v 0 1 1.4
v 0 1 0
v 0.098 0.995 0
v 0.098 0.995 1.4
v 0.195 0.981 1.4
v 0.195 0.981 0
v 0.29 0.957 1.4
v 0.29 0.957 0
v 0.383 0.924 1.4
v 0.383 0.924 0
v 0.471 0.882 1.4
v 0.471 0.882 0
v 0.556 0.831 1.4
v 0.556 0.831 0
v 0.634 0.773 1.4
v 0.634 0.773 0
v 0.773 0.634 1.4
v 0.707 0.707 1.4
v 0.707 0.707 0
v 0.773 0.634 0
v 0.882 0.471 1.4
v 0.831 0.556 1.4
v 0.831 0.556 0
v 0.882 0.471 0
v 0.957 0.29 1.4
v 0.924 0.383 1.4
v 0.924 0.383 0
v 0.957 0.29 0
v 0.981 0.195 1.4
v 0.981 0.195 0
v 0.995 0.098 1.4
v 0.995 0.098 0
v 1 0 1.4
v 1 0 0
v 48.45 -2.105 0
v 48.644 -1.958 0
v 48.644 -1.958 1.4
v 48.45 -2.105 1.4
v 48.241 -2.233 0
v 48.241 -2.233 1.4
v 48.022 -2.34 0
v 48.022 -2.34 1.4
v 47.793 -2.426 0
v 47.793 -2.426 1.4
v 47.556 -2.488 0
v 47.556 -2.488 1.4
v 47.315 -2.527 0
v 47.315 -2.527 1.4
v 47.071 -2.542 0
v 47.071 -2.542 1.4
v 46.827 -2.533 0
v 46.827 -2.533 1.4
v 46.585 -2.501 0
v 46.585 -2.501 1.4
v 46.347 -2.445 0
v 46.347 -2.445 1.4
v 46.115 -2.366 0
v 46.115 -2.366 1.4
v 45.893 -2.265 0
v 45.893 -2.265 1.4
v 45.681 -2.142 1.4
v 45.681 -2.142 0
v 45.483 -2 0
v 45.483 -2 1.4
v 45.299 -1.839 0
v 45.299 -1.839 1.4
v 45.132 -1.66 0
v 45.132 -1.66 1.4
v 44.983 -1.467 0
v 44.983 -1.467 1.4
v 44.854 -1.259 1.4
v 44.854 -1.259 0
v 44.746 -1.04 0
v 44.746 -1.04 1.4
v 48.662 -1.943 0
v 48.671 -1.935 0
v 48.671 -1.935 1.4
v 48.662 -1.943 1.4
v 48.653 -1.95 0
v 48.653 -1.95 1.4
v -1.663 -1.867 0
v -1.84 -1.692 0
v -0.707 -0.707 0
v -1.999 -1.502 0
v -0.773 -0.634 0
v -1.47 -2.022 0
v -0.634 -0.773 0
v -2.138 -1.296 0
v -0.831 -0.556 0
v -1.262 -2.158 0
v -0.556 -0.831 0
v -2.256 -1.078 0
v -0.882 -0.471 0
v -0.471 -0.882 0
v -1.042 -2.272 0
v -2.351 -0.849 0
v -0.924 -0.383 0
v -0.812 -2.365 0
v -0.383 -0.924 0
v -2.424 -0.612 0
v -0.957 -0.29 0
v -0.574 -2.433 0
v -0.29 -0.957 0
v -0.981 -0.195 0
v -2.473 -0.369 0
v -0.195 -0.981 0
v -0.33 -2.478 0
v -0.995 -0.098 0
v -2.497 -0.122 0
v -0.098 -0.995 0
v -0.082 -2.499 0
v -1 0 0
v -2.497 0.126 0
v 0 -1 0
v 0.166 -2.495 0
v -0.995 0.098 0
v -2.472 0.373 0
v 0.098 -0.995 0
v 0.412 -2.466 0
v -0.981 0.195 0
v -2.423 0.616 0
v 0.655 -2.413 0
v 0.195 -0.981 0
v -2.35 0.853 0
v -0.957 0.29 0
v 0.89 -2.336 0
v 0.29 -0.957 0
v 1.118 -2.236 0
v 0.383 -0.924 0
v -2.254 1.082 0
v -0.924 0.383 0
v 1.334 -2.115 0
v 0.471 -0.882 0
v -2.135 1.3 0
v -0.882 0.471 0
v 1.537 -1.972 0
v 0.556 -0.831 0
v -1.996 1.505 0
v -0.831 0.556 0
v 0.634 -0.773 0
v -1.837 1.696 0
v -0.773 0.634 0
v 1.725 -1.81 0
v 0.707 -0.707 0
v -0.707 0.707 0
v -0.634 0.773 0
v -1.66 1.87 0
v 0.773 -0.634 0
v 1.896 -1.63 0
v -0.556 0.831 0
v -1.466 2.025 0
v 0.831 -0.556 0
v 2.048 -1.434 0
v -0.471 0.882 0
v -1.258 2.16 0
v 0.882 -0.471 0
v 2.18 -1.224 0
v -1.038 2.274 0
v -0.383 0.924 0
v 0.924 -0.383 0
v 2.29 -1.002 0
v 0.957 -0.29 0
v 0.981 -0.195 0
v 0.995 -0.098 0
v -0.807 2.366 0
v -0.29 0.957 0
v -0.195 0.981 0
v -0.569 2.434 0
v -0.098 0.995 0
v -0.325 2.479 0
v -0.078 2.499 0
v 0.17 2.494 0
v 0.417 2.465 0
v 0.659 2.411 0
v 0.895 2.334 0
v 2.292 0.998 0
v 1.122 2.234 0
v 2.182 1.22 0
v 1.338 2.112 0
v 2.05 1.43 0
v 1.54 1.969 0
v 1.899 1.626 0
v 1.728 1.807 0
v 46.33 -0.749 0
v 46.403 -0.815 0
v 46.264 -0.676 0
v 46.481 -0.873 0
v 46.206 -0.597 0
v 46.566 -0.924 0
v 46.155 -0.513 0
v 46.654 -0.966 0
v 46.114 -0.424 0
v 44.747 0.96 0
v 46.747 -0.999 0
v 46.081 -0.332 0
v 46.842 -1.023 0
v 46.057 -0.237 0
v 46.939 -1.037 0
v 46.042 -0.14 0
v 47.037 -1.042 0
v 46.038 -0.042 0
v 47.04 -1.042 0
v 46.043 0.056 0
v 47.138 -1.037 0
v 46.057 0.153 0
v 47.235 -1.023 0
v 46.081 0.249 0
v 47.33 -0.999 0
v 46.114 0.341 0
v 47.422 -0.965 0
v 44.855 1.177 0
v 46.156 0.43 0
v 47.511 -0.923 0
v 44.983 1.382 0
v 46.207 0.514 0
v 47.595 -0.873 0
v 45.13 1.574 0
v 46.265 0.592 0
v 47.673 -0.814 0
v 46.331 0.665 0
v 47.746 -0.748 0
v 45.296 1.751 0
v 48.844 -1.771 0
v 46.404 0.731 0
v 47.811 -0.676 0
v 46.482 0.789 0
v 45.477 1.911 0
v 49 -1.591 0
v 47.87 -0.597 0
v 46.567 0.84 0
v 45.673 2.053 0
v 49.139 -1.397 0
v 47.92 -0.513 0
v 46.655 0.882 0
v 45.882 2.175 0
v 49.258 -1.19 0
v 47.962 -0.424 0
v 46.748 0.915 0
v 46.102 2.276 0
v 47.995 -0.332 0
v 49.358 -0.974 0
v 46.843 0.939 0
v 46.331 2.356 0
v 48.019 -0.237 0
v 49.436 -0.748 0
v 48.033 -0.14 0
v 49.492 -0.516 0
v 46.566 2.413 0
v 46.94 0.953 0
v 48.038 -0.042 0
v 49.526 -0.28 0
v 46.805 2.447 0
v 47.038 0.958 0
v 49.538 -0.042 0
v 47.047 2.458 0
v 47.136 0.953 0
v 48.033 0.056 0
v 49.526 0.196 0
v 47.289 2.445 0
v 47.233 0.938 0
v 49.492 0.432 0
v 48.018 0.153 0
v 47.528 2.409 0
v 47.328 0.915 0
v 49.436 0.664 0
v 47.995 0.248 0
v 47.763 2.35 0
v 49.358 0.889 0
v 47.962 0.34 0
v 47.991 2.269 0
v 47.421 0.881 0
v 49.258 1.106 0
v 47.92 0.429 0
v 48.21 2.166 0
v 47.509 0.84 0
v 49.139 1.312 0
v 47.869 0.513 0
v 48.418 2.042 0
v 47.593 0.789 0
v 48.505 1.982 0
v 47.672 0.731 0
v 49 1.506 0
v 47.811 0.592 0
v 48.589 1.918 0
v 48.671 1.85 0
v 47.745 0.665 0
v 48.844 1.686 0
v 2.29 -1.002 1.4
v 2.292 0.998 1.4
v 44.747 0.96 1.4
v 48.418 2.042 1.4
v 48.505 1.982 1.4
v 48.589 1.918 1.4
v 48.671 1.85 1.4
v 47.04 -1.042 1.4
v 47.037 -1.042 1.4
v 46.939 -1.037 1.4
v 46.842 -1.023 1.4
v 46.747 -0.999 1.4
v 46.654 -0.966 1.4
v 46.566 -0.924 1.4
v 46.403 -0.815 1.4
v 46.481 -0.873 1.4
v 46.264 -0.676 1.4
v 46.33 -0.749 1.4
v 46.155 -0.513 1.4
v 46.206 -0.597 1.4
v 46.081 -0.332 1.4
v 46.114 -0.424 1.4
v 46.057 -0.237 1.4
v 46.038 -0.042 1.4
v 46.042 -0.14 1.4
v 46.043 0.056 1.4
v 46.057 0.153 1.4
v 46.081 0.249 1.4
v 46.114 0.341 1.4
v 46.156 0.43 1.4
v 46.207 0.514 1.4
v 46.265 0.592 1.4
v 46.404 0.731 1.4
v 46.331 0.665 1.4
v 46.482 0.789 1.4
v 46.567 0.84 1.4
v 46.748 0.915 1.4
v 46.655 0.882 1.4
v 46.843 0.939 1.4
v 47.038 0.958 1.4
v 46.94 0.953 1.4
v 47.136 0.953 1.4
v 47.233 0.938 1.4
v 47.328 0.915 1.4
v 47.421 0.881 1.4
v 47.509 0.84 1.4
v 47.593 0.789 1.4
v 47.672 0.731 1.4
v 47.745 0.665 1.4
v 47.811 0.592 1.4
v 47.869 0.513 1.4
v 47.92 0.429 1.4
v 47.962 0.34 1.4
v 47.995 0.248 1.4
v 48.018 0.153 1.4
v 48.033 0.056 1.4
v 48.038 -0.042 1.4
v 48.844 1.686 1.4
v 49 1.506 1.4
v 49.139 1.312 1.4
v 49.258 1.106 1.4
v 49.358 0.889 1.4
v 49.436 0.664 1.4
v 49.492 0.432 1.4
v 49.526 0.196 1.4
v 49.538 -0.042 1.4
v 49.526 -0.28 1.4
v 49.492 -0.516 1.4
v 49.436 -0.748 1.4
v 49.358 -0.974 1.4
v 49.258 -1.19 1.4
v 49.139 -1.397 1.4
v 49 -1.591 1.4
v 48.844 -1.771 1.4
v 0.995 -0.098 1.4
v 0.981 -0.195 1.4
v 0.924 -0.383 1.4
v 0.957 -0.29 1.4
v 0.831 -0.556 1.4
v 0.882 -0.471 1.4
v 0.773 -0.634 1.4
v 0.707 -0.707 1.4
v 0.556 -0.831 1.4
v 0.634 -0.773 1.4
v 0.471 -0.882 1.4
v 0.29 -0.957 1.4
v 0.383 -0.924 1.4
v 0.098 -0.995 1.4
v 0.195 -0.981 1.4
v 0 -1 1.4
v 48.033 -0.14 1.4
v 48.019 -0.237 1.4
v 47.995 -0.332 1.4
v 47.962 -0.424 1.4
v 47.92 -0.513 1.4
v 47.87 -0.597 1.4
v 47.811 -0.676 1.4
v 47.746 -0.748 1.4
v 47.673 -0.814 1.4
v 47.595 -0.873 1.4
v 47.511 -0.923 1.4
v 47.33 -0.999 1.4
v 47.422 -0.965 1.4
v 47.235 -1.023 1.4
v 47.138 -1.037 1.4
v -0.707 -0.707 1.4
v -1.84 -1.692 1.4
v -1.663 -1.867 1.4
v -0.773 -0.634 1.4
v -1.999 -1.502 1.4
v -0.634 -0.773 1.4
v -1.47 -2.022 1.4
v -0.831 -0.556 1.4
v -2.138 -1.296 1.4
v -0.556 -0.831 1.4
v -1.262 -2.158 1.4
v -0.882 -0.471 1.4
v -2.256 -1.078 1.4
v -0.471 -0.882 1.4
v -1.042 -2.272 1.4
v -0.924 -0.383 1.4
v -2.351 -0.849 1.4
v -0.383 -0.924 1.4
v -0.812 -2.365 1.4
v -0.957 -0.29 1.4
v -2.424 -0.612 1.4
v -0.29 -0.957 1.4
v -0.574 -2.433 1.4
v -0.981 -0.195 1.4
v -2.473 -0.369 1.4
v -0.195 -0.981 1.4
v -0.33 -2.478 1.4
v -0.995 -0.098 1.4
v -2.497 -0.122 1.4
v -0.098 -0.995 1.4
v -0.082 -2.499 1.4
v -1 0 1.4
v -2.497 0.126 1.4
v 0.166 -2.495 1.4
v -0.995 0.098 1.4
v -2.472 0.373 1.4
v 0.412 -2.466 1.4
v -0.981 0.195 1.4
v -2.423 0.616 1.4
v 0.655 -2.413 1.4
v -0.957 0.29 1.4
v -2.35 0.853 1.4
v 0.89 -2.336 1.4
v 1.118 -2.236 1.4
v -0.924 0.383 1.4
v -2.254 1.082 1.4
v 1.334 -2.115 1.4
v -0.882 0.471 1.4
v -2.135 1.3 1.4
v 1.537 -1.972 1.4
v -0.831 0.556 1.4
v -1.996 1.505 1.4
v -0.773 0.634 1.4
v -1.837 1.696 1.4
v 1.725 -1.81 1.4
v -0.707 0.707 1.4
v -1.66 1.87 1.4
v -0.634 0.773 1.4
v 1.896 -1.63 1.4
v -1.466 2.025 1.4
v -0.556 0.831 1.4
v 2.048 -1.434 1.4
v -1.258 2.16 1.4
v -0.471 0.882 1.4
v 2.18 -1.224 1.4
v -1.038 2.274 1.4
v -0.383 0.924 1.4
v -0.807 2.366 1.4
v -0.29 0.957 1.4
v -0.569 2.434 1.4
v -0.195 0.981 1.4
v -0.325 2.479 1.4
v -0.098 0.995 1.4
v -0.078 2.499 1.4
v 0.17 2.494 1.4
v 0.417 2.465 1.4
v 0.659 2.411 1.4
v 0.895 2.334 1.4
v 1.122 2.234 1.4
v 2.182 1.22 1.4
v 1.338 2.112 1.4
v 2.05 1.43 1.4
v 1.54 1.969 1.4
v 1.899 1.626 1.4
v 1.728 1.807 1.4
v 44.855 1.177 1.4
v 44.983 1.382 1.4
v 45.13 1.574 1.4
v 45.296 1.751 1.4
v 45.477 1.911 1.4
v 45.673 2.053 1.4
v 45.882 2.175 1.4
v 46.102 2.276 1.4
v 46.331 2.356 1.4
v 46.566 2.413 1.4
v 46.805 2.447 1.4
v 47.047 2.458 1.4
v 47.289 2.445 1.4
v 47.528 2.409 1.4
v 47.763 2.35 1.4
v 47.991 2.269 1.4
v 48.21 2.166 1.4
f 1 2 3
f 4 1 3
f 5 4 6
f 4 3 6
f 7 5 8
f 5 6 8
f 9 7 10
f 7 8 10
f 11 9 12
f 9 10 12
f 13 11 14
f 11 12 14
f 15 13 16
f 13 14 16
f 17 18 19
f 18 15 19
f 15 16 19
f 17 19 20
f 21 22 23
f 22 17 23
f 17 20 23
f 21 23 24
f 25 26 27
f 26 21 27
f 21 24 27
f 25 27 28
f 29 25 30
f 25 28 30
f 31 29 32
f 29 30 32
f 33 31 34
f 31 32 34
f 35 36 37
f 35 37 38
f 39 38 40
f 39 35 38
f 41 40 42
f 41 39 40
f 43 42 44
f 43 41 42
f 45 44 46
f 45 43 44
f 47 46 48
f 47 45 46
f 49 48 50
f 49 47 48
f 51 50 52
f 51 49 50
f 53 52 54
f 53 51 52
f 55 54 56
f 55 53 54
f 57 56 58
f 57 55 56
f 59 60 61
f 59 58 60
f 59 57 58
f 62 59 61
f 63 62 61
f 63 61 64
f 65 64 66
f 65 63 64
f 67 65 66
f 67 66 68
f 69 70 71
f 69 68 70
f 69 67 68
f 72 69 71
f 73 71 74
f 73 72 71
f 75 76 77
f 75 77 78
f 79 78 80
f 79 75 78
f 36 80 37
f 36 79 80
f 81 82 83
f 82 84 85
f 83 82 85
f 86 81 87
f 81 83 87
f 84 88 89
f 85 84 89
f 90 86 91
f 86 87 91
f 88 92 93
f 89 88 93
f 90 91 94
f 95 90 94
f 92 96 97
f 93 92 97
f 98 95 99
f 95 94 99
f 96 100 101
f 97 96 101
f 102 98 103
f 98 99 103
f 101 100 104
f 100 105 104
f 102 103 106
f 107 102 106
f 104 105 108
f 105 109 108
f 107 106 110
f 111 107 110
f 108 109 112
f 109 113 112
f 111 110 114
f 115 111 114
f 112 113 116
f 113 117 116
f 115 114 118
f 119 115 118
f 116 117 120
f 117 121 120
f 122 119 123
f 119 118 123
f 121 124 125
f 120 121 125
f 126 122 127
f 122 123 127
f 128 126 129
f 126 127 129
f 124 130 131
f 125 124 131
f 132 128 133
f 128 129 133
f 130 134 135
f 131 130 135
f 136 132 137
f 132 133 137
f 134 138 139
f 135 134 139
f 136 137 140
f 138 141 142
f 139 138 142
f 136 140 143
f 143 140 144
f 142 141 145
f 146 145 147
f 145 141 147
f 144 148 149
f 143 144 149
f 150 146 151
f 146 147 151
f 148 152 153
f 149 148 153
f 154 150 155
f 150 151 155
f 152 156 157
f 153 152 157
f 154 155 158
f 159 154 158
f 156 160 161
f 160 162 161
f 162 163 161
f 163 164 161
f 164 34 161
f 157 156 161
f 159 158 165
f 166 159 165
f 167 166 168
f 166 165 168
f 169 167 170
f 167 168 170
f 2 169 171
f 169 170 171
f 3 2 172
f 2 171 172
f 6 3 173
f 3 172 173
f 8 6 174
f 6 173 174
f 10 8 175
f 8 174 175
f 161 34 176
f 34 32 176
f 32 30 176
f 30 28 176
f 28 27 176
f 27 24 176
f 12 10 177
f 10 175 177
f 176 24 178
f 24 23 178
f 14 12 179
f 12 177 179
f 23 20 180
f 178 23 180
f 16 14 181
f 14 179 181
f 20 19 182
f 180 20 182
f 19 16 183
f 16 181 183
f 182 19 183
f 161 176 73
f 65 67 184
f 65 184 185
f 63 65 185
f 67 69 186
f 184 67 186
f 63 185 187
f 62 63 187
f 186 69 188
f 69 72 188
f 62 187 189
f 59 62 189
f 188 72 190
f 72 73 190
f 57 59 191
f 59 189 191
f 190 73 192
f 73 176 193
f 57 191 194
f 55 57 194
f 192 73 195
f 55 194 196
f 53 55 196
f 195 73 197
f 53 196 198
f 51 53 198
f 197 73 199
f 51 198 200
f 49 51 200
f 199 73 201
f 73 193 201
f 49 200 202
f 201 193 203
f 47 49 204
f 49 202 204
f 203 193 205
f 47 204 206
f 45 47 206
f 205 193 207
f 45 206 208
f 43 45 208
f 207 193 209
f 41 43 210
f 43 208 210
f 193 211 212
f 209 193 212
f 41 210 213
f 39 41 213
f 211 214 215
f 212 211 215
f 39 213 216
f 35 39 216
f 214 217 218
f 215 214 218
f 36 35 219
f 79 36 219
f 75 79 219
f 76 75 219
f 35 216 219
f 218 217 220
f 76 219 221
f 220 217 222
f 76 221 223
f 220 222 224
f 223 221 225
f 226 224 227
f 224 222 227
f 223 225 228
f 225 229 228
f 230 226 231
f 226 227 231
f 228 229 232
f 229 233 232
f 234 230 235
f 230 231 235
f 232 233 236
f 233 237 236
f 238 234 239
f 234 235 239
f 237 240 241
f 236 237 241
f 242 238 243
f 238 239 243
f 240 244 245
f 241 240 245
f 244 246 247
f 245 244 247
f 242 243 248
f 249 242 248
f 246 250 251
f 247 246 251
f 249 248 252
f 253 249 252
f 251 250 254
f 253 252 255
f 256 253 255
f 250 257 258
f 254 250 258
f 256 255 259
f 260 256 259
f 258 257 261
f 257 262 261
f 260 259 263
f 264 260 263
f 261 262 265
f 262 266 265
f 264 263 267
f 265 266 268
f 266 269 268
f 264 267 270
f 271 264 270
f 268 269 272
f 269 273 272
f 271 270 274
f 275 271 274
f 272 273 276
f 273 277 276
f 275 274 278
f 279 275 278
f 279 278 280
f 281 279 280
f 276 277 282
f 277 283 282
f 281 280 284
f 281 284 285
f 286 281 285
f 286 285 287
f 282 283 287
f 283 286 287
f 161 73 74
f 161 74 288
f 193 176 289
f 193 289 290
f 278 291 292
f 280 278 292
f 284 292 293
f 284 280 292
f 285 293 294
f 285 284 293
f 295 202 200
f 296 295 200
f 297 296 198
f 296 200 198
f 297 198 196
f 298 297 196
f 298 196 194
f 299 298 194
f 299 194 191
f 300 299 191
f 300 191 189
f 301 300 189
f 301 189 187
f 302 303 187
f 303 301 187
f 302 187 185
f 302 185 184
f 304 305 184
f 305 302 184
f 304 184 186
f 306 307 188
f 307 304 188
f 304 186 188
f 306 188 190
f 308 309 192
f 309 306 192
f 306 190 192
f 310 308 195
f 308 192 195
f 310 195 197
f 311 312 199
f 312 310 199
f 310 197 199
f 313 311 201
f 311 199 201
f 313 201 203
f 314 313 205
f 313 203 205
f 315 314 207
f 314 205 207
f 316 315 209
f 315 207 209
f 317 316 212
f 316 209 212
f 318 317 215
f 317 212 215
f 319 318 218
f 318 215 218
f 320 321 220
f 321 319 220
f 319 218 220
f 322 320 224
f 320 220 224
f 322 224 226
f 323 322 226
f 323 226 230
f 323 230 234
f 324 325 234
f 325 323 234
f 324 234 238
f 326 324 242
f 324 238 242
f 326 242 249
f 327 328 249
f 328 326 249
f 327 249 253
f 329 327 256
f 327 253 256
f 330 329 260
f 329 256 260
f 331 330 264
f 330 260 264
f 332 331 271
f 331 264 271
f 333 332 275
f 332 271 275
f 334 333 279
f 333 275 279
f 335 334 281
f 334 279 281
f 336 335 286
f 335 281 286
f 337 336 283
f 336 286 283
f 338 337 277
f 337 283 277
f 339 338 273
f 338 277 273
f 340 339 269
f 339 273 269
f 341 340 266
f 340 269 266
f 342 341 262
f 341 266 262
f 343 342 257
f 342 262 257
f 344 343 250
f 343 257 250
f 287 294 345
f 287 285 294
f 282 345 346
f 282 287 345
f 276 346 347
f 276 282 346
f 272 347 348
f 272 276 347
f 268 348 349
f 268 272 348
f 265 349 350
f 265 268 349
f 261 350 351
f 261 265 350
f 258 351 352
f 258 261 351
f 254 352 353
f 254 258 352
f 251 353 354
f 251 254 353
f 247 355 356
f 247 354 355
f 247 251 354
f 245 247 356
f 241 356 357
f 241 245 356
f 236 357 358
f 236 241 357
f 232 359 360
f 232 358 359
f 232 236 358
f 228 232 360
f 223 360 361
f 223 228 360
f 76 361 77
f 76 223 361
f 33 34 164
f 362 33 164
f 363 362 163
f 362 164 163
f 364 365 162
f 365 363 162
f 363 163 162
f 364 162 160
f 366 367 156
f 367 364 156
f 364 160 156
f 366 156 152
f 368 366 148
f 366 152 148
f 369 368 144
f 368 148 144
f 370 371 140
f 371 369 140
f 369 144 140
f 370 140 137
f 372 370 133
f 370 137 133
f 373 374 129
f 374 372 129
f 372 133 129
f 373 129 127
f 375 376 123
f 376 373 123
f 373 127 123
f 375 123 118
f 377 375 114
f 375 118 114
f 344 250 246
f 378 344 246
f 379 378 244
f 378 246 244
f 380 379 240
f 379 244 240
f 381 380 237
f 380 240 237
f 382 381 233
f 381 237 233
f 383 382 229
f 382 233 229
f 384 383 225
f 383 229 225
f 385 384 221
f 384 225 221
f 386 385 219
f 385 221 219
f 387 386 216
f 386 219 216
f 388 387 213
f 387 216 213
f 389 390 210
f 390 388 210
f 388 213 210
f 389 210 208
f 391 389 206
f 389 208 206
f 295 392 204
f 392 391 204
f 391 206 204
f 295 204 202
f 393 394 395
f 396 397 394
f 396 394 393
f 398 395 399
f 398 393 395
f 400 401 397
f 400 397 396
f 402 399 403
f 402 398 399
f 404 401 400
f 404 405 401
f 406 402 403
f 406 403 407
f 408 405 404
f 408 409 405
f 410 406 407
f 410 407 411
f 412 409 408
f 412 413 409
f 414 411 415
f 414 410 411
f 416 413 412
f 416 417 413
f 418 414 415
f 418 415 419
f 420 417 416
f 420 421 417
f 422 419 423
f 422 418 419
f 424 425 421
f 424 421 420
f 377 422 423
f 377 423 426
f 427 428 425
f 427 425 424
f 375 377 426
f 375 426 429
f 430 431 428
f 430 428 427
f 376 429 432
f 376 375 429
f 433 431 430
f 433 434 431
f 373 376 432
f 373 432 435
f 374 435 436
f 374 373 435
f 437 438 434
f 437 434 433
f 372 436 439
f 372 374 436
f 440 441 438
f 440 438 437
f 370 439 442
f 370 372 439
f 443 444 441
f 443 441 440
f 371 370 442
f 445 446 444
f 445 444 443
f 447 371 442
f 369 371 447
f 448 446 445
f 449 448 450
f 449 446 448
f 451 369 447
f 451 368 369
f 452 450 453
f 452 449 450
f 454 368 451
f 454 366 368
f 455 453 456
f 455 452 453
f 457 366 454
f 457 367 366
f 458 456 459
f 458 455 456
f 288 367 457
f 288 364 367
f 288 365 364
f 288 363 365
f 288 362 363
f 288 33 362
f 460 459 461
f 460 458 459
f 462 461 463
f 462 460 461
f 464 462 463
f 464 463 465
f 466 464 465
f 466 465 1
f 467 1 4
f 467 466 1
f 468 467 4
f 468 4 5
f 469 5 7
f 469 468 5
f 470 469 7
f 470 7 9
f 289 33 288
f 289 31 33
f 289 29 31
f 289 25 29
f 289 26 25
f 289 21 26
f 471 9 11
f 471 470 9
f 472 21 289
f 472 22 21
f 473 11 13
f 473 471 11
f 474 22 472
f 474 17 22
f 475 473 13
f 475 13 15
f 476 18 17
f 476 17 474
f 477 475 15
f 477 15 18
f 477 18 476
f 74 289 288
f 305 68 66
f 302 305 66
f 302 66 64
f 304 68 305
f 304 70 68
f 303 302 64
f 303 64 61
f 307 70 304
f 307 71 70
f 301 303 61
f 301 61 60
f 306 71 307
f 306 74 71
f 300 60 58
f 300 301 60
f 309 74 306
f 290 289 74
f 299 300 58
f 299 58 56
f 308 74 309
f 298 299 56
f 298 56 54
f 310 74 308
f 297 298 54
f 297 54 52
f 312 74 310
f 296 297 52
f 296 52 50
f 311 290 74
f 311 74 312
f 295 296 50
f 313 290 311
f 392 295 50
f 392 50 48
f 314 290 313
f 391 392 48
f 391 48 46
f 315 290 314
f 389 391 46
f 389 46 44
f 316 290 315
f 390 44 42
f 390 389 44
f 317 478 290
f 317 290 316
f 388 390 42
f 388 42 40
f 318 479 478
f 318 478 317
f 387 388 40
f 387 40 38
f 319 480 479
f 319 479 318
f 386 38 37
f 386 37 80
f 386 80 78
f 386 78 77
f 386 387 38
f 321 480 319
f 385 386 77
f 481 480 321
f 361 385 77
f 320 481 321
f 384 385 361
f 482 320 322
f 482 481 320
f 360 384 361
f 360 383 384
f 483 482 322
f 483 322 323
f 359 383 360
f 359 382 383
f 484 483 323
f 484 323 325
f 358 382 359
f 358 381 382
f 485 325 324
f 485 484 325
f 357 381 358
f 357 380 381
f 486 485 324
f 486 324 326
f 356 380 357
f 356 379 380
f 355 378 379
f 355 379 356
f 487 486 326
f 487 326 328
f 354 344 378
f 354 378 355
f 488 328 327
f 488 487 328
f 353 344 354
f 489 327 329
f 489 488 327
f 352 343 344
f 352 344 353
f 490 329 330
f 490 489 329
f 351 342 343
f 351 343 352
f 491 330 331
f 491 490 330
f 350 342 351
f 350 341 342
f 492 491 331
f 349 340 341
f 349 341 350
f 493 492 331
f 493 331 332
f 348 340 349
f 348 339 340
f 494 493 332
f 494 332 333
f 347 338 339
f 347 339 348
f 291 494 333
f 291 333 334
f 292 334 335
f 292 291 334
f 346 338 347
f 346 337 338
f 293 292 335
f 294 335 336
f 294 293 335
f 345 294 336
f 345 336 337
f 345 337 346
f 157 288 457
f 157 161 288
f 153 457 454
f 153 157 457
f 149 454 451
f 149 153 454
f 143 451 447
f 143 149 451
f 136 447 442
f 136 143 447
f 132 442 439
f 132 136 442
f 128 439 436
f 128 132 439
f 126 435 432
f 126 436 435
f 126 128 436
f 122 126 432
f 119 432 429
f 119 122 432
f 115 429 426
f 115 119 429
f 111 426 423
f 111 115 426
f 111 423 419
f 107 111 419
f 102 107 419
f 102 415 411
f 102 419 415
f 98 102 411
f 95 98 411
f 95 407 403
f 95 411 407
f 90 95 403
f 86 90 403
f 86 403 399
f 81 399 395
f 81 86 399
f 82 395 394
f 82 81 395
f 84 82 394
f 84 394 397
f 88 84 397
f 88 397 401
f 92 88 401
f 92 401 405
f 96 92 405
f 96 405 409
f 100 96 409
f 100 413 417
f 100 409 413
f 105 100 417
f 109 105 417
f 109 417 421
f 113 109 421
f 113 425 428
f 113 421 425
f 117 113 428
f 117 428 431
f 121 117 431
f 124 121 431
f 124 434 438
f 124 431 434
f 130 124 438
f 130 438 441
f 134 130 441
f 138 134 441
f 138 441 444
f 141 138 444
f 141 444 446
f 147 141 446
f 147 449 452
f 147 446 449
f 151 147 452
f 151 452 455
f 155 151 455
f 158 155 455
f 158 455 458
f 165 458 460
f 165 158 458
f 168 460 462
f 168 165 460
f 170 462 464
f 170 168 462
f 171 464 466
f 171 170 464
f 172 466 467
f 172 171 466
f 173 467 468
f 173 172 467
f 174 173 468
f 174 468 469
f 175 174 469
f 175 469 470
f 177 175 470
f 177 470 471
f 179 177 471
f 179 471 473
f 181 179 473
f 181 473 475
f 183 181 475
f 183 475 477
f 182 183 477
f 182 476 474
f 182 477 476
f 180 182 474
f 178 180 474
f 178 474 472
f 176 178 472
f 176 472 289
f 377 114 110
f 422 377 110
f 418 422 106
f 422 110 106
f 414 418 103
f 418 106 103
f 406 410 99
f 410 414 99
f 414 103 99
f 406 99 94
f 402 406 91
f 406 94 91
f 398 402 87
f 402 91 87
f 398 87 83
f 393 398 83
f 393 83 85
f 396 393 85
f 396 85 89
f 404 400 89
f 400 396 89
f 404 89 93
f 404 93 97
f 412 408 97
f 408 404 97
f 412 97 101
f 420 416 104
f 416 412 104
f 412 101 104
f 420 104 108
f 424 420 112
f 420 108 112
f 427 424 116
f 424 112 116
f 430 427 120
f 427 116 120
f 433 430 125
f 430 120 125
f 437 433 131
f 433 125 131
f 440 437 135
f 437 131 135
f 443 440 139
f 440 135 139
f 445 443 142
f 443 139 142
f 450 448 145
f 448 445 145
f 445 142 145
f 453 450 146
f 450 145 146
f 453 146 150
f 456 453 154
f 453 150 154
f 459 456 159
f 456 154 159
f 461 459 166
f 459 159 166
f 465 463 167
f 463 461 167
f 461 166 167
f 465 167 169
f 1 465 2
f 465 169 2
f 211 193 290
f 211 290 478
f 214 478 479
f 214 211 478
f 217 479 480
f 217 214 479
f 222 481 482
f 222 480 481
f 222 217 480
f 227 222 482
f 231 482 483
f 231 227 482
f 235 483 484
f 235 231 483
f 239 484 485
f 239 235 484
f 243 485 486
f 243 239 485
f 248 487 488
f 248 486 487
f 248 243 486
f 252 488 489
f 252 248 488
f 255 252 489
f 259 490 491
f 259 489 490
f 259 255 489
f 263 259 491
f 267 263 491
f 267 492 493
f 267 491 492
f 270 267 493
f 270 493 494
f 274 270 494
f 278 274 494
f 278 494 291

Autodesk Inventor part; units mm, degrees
ref_plane "YZ Plane" through (0, 0, 0) normal (1, 0, 0) x (0, 1, 0)
ref_plane "XZ Plane" through (0, 0, 0) normal (0, 1, 0) x (-1, 0, 0)
ref_plane "XY Plane" through (0, 0, 0) normal (0, 0, 1) x (1, 0, 0)
sketch "Sketch1" plane through (0, 0, 0) normal (0, 0, 1) x (1, 0, 0)
  circle A0 centre (0, 0) radius 1
  circle A1 centre (47.0377, -0.0423) radius 1
  arc A2 (2.2923, 0.9976) -> (2.2904, -1.0021) centre (0, 0) ccw
  arc A3 (44.7455, -1.0402) -> (44.7473, 0.9598) centre (47.0377, -0.0423) ccw
  line L0 (0, -2) -> (0, 1)
  line L1 (48.4179, 2.0423) -> (48.671, 2.0423)
  line L2 (48.671, -1.9577) -> (48.6442, -1.9577)
  line L3 (48.671, 2.0423) -> (48.671, 1.8505)
  line L4 (48.671, -1.935) -> (48.671, -1.9577)
  line L5 (0, 1) -> (0.0018, 1)
  line L6 (2.2923, 0.9976) -> (44.7473, 0.9598)
  line L7 (47.0404, -1.0422) -> (47.0368, -1.0423)
  line L8 (44.7455, -1.0402) -> (2.2904, -1.0021)
  dimension "d0" = 2
  dimension "d1" = 2
  dimension "d2" = 5
  dimension "d3" = 5
  dimension "d5" = 4
extrude "Extrusion1" add sketch "Sketch1" along normal blind 1.4 contours L6 A3 L8 A2
sketch "Sketch2" plane through (0, 0, 0) normal (0, 0, -1) x (-1, 0, 0)
  point P0 (0, 0)
properties part number "Restrain_Pin_1"
